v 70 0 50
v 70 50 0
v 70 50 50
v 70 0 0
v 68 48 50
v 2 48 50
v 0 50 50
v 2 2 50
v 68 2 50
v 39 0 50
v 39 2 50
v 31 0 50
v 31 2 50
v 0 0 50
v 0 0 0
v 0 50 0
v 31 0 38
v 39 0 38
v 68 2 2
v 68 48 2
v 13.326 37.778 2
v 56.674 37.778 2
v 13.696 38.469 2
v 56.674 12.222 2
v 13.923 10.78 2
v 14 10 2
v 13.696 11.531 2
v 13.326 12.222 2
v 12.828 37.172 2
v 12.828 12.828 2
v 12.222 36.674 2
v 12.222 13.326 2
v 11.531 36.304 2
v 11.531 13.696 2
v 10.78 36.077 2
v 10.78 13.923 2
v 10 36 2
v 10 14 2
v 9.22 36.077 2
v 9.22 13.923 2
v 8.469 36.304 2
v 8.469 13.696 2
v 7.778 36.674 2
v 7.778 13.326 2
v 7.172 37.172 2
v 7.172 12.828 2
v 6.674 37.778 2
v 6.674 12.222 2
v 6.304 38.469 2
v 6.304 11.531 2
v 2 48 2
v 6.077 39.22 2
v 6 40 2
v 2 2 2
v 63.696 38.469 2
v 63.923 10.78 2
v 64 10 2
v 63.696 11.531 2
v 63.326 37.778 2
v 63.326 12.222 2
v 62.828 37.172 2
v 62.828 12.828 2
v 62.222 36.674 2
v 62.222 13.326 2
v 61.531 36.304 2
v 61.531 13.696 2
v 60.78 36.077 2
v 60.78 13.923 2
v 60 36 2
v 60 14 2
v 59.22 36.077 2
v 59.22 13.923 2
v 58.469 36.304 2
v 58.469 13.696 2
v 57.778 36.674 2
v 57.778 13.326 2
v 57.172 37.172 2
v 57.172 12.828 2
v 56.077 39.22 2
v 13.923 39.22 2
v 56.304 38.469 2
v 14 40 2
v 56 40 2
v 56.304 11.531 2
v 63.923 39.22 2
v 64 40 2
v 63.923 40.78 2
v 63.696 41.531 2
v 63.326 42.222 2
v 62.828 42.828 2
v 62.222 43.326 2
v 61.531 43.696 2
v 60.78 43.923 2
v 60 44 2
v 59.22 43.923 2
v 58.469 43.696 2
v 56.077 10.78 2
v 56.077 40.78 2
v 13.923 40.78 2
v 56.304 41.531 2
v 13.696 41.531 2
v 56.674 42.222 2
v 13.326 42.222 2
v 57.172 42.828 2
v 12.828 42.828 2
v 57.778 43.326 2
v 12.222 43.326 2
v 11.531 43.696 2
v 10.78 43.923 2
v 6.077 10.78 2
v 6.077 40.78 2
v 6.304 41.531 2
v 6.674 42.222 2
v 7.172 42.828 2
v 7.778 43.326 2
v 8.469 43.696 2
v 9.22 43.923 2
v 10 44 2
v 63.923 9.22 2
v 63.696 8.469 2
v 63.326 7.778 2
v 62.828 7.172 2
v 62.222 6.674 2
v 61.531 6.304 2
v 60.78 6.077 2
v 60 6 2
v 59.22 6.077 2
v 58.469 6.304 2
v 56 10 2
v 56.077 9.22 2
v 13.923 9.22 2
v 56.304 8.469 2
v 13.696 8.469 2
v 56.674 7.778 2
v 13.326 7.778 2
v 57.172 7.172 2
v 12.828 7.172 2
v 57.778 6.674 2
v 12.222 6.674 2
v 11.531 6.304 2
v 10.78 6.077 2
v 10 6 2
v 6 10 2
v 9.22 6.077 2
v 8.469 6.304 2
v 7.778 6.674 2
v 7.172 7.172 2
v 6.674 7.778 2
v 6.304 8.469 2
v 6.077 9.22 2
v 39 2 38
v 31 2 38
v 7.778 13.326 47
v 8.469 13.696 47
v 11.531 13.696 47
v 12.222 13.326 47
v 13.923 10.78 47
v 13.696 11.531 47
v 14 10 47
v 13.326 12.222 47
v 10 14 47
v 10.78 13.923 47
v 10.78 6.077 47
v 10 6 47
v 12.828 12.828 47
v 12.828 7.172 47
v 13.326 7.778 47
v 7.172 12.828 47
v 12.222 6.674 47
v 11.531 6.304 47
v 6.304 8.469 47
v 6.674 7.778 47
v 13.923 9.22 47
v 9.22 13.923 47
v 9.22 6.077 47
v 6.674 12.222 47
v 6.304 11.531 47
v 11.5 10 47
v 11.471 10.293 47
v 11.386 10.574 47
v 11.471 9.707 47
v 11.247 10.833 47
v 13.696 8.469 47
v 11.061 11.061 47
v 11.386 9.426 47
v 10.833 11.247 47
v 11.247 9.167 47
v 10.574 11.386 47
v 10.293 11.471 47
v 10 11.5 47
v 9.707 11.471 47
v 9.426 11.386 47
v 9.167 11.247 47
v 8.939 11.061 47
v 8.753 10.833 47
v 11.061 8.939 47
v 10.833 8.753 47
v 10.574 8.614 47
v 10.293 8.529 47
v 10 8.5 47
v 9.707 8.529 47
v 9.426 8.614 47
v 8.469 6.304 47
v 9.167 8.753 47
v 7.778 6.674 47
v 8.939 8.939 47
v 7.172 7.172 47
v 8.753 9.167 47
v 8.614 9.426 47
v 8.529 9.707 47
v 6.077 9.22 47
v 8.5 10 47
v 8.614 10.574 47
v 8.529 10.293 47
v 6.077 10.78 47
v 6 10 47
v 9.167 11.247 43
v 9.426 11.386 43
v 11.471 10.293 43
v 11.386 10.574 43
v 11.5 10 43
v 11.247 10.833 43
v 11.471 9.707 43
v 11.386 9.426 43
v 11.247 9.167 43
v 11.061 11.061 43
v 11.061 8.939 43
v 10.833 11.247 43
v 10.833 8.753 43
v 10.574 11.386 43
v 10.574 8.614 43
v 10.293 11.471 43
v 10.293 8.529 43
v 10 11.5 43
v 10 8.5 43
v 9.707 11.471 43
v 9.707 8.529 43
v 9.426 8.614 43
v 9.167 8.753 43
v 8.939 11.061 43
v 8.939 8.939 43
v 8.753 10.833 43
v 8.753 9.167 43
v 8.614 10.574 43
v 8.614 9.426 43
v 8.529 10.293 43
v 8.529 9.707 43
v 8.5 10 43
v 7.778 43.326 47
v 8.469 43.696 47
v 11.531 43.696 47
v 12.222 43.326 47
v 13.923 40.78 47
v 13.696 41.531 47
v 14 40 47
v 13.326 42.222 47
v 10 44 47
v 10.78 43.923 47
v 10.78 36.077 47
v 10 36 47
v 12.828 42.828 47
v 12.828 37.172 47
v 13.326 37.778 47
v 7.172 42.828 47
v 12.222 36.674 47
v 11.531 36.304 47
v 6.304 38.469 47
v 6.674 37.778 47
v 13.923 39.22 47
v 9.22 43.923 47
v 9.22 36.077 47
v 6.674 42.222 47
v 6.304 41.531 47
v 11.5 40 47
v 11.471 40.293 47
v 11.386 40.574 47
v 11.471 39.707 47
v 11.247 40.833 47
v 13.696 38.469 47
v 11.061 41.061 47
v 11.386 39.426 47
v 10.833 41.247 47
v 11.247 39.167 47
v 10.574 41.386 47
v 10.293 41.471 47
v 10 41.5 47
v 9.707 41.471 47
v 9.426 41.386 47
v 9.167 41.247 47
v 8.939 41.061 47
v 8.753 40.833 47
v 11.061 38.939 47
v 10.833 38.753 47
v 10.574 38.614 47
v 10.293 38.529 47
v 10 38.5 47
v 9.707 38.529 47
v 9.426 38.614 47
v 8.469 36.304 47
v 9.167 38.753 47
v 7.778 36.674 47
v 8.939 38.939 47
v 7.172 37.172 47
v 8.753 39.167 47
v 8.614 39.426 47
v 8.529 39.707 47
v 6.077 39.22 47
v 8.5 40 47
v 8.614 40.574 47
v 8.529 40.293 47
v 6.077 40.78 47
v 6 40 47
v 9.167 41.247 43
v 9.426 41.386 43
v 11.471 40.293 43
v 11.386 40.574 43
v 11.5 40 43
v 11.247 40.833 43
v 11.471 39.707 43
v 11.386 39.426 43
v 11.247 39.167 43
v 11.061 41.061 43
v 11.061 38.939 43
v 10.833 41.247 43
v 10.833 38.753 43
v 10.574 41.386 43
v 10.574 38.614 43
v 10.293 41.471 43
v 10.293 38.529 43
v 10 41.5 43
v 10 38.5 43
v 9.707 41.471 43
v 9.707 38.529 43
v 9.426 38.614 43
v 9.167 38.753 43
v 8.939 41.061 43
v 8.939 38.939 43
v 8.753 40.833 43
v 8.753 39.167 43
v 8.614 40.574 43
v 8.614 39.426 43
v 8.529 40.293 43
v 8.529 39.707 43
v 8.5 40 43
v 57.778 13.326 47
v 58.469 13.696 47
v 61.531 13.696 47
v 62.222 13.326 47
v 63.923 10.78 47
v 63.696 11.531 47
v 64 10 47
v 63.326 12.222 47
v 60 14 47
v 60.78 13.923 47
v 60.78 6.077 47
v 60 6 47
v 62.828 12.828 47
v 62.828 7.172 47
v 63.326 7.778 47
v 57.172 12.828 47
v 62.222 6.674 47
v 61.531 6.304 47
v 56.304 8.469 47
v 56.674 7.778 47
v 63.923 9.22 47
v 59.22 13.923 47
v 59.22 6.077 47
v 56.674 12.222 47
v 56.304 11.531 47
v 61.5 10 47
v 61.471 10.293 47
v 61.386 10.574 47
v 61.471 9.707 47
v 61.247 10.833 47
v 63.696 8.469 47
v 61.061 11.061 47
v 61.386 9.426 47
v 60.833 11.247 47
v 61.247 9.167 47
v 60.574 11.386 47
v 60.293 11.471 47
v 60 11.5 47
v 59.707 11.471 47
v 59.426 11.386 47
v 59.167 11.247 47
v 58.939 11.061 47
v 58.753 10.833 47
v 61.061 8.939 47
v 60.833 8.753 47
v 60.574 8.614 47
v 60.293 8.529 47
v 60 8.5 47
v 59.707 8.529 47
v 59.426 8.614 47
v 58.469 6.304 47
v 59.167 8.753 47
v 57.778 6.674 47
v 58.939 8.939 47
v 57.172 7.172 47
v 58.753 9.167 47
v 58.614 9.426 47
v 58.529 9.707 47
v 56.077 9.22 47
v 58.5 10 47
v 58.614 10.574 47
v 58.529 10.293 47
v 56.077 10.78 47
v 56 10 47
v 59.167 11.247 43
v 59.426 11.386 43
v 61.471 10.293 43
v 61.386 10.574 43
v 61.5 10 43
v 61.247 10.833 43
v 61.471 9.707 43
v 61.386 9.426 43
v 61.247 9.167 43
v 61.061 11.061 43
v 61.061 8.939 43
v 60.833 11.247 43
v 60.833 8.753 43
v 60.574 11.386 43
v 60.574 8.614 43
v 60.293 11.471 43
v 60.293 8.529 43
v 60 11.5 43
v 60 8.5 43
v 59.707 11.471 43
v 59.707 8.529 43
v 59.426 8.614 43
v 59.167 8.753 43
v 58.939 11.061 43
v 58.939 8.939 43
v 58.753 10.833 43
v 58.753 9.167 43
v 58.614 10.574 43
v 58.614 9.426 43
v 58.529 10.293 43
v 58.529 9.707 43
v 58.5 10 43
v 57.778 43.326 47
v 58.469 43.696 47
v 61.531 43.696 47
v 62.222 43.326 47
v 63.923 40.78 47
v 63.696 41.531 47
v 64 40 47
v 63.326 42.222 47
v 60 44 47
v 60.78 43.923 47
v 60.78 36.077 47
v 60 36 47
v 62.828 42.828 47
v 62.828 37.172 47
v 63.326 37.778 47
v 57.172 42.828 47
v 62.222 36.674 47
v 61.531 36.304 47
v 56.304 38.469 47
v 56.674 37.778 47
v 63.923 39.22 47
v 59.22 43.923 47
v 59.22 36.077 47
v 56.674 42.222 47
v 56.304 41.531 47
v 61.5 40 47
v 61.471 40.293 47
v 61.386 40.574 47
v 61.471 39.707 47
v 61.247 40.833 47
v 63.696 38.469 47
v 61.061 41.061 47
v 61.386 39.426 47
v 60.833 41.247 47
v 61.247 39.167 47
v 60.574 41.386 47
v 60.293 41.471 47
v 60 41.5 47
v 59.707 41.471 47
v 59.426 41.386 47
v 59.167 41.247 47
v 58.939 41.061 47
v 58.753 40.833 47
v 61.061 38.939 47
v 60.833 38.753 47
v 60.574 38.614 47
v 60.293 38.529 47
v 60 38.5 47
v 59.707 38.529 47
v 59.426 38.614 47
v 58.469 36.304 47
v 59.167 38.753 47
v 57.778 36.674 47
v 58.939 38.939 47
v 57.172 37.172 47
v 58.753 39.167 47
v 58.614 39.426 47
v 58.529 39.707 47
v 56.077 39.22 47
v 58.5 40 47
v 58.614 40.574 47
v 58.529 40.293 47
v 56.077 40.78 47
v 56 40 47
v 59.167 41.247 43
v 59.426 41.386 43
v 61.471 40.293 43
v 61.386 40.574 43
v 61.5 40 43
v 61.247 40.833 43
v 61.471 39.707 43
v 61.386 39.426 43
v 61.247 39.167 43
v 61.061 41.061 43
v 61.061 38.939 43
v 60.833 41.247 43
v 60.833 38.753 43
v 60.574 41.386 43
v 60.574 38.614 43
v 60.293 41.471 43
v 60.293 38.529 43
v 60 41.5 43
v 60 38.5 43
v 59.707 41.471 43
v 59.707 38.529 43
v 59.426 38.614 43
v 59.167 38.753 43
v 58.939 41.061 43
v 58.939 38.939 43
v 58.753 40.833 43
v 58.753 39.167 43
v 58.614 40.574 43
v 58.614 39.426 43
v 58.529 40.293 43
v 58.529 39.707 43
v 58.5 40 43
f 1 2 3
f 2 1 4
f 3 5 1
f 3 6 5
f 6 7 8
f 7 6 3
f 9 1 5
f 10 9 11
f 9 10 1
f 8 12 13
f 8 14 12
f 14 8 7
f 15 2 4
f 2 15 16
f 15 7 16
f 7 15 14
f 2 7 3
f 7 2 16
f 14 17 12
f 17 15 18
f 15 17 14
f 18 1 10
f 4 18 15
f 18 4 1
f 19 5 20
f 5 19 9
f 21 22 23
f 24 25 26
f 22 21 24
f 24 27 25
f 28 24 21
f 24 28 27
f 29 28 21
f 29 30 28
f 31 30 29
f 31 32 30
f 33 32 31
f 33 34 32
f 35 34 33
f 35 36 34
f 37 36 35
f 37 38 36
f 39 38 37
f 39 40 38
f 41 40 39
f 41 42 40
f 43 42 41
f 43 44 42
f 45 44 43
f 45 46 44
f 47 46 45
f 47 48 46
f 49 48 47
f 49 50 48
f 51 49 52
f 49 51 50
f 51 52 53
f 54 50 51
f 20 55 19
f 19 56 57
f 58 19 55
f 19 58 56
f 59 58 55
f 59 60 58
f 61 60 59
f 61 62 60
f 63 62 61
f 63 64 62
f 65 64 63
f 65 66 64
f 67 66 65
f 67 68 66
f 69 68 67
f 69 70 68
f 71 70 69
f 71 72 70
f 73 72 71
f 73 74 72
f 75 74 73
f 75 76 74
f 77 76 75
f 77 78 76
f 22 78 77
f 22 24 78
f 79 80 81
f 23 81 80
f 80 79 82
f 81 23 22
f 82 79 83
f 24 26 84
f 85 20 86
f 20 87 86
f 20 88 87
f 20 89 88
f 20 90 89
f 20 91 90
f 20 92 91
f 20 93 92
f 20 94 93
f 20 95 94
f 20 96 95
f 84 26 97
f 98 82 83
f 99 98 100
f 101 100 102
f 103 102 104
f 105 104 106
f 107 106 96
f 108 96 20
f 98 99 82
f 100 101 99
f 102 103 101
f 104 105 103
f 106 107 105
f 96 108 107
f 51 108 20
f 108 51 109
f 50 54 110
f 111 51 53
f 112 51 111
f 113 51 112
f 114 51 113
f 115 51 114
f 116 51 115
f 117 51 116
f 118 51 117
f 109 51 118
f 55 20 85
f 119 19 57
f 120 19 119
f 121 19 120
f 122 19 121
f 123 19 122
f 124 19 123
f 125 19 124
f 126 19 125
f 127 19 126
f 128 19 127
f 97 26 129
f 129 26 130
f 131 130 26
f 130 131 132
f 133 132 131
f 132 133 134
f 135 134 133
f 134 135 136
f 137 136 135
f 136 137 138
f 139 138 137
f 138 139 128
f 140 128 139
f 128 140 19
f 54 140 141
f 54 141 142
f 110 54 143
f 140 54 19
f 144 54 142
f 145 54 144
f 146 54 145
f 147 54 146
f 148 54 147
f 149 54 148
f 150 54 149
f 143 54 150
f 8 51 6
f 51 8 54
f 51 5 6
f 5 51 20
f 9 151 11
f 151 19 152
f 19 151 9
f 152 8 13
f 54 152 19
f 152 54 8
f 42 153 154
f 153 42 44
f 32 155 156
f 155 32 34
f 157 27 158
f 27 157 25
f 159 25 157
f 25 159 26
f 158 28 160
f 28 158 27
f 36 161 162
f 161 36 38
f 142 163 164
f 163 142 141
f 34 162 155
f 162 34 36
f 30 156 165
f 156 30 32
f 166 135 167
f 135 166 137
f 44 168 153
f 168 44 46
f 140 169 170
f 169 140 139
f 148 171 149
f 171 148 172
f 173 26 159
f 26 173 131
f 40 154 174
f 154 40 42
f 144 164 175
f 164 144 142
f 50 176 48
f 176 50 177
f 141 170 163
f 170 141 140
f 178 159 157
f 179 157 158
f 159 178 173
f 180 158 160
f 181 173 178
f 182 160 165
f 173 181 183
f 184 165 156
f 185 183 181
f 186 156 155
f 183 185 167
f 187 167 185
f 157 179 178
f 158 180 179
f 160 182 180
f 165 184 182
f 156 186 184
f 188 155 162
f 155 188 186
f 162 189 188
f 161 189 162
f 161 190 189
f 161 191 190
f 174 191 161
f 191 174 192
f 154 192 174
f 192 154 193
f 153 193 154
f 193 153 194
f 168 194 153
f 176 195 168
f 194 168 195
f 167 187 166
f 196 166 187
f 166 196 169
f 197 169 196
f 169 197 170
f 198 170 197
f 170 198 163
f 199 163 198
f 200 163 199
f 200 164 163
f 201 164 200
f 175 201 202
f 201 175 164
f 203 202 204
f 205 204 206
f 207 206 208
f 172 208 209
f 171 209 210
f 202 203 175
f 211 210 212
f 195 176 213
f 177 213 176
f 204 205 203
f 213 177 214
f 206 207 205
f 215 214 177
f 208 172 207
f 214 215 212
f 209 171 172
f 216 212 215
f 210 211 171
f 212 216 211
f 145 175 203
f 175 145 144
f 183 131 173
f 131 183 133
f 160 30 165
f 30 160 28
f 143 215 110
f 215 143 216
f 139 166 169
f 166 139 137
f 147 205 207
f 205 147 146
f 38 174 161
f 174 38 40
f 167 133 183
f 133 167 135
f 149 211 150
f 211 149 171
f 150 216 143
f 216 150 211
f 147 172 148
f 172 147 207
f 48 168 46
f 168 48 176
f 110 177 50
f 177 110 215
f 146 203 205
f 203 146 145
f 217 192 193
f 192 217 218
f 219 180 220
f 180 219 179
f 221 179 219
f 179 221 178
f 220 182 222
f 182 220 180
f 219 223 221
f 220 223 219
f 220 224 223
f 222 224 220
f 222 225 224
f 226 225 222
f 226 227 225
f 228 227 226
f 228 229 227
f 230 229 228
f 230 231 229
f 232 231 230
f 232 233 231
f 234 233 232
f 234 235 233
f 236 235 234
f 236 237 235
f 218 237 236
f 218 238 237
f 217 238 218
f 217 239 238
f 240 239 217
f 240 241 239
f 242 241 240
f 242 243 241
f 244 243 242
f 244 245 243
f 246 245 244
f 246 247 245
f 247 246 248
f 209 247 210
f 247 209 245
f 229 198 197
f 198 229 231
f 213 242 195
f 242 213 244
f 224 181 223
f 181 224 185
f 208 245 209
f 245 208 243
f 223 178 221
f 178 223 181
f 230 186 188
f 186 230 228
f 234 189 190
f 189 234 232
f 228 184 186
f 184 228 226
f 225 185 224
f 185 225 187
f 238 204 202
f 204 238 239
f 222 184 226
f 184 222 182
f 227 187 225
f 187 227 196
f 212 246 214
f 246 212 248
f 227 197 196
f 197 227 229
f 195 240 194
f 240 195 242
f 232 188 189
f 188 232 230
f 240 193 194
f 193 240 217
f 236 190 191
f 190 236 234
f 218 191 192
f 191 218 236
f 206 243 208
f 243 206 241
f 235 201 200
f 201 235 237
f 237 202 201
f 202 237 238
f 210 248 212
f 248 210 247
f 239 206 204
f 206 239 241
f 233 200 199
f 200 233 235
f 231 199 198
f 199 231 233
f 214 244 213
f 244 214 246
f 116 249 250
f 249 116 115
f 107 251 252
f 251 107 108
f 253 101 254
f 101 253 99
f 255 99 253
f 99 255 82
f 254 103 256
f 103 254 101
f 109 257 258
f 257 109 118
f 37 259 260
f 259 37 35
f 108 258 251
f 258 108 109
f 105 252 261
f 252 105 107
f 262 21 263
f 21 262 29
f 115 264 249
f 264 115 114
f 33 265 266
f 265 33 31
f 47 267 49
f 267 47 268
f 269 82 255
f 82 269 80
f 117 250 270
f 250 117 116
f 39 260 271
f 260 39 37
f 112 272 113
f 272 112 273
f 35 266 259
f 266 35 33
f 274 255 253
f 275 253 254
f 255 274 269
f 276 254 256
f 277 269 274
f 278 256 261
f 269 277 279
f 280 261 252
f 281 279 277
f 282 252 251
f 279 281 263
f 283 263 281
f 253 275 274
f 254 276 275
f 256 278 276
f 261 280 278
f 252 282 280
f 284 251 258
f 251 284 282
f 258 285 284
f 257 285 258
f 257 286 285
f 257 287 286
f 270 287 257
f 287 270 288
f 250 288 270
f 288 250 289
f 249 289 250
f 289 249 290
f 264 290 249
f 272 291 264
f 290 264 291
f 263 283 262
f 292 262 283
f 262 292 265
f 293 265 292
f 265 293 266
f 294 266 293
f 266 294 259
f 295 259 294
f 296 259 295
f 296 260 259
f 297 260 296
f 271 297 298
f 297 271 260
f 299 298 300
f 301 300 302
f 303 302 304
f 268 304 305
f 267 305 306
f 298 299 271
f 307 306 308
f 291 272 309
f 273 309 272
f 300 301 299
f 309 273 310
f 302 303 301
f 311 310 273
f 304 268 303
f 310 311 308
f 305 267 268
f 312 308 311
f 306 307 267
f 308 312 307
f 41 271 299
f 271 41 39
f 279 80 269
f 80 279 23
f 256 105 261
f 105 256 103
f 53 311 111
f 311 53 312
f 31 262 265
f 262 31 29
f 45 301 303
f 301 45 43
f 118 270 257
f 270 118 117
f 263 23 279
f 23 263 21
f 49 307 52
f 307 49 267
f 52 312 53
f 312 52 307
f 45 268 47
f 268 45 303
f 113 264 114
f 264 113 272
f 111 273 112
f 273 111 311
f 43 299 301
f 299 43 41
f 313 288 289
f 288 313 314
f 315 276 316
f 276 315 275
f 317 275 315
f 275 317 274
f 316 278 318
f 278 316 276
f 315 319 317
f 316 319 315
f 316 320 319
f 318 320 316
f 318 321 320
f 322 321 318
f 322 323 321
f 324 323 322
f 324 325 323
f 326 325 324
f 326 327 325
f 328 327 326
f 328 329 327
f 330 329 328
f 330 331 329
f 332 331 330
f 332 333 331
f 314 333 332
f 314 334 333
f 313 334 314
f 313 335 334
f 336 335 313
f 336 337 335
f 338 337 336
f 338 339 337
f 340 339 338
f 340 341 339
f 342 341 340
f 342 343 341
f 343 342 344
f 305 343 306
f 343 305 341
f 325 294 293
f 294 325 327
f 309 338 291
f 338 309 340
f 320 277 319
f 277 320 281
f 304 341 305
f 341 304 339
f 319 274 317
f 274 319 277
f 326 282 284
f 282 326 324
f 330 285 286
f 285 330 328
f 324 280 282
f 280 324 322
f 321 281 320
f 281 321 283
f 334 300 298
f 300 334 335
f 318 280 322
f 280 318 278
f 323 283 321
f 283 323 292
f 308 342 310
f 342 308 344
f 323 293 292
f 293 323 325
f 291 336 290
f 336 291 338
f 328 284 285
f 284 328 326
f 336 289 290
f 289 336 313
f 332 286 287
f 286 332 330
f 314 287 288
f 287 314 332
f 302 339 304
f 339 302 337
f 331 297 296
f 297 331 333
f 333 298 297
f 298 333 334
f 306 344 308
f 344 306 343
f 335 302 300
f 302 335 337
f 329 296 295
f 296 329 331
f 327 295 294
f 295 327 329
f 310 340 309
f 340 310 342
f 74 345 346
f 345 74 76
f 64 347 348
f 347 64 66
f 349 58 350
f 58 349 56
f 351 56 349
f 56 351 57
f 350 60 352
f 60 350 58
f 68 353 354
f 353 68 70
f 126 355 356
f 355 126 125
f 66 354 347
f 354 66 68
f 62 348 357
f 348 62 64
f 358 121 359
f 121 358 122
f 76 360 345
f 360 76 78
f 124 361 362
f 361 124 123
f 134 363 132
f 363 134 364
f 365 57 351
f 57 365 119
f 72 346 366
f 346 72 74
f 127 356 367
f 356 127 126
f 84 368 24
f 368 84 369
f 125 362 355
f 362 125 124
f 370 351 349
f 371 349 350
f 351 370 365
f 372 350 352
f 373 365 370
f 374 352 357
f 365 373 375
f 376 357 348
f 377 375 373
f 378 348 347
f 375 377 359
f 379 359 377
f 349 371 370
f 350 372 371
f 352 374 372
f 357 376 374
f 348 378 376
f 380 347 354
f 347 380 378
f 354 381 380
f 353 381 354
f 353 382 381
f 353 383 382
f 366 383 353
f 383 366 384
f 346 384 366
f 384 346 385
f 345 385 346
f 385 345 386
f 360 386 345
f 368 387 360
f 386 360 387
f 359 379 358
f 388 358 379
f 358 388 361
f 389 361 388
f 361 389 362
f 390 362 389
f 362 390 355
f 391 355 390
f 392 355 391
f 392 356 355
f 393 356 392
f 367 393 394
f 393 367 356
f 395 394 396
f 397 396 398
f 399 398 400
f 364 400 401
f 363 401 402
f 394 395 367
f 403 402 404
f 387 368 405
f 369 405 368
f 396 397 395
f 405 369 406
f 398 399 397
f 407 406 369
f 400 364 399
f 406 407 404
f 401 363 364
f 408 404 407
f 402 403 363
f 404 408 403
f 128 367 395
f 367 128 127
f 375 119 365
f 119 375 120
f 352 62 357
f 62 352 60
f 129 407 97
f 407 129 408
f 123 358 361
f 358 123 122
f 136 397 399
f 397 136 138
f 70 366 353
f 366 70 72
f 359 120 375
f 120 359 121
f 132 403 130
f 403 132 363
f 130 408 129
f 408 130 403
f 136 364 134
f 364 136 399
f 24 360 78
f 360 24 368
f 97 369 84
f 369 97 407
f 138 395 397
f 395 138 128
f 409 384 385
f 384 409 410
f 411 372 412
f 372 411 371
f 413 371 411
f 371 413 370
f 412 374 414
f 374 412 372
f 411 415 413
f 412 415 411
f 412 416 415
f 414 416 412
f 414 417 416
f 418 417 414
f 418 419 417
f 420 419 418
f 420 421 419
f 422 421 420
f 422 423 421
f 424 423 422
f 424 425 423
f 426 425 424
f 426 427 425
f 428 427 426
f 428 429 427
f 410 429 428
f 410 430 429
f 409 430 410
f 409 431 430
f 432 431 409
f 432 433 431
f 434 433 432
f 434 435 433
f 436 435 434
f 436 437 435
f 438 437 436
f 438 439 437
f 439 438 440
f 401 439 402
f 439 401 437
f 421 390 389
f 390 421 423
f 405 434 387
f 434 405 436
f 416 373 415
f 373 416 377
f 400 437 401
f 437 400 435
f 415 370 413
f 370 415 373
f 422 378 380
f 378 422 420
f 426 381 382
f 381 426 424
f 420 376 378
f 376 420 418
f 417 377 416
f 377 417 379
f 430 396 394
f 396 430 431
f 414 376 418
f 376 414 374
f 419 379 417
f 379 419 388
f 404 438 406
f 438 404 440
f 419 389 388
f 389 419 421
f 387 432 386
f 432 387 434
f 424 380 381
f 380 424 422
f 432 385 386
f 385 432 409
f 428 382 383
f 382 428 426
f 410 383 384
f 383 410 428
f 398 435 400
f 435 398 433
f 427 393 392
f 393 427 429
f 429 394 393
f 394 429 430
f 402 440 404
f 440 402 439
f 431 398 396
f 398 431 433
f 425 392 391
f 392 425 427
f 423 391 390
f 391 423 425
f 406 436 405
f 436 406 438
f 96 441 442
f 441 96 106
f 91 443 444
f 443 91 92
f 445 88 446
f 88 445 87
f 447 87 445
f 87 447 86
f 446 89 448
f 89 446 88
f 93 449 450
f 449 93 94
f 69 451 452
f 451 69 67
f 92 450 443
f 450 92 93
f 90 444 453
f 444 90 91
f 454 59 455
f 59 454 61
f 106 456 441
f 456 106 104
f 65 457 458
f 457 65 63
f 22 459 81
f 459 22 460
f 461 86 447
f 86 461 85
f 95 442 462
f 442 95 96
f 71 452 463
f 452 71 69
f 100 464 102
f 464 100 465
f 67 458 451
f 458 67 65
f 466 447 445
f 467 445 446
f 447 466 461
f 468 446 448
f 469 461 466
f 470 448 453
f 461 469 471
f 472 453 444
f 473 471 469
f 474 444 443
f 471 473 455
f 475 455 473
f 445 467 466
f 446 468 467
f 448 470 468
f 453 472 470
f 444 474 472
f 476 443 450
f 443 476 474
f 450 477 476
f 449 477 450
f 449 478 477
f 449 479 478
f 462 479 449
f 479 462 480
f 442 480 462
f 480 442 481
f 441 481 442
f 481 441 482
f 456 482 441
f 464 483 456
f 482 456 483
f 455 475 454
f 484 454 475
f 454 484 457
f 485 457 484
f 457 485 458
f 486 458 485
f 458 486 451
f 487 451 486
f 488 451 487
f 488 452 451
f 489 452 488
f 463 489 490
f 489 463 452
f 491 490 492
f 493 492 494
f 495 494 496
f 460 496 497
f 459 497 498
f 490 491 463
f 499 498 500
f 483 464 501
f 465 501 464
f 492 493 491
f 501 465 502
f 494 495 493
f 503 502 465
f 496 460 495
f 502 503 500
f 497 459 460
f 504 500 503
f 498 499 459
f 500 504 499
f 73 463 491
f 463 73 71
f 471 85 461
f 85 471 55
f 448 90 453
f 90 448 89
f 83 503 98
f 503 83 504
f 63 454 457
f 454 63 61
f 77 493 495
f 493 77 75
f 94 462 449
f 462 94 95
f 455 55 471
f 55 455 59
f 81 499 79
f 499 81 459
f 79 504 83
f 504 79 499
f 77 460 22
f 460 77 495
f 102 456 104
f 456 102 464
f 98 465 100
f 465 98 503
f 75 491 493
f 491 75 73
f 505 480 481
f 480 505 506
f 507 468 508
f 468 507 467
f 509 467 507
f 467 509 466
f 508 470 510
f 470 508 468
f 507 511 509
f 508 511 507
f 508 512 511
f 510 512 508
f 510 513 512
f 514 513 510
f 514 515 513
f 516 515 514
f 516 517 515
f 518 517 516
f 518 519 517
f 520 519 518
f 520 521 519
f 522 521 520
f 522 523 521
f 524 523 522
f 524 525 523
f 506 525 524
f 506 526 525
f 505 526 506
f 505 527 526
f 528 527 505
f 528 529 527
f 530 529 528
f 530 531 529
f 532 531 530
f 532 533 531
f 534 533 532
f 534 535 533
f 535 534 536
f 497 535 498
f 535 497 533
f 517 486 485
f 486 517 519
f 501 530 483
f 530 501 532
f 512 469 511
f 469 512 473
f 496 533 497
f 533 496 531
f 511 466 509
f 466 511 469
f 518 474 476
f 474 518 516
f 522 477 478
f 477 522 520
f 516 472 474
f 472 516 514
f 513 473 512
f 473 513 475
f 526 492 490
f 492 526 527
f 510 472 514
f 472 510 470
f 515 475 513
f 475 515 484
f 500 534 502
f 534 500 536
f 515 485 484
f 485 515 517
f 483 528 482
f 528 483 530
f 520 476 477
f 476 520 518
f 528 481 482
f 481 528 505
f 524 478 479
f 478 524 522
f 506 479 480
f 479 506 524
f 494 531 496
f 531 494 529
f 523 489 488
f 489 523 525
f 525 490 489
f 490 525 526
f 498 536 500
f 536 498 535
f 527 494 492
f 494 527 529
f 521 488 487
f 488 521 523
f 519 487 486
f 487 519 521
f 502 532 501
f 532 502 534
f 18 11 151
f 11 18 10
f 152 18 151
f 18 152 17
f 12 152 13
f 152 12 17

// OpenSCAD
$fn = 32;

// ----------------------------------------------------------------------
// Enclosure box: both enclosure
// ----------------------------------------------------------------------

// --- parameters (mm) ---
box_l = 70;               // outer length, X
box_w = 50;               // outer width, Y
box_h = 50;               // outer height
wall_t = 2;               // wall thickness
boss_r = 4;               // corner boss radius
hole_r = 1.5;             // boss screw hole radius
boss_in = 10;             // boss inset from the corners
notch_w = 8;              // cable notch width
notch_h = 12;             // cable notch height

inner_h = box_h - wall_t;  // cavity depth
boss_h = inner_h - 2;  // corner boss height

difference() {
  union() {
    difference() {
      cube([box_l, box_w, box_h]);
      translate([wall_t, wall_t, wall_t])
        cube([box_l - 2 * wall_t, box_w - 2 * wall_t, box_h]);
    }
    for (sx = [0, 1], sy = [0, 1])
      translate([sx ? box_l - boss_in : boss_in,
                 sy ? box_w - boss_in : boss_in, wall_t - 1])
        difference() {
          cylinder(r = boss_r, h = boss_h);
          translate([0, 0, boss_h - 4])
            cylinder(r = hole_r, h = 5);
        }
  }
  translate([box_l / 2 - notch_w / 2, -1, box_h - notch_h])
    cube([notch_w, wall_t + 2, notch_h + 1]);
}
